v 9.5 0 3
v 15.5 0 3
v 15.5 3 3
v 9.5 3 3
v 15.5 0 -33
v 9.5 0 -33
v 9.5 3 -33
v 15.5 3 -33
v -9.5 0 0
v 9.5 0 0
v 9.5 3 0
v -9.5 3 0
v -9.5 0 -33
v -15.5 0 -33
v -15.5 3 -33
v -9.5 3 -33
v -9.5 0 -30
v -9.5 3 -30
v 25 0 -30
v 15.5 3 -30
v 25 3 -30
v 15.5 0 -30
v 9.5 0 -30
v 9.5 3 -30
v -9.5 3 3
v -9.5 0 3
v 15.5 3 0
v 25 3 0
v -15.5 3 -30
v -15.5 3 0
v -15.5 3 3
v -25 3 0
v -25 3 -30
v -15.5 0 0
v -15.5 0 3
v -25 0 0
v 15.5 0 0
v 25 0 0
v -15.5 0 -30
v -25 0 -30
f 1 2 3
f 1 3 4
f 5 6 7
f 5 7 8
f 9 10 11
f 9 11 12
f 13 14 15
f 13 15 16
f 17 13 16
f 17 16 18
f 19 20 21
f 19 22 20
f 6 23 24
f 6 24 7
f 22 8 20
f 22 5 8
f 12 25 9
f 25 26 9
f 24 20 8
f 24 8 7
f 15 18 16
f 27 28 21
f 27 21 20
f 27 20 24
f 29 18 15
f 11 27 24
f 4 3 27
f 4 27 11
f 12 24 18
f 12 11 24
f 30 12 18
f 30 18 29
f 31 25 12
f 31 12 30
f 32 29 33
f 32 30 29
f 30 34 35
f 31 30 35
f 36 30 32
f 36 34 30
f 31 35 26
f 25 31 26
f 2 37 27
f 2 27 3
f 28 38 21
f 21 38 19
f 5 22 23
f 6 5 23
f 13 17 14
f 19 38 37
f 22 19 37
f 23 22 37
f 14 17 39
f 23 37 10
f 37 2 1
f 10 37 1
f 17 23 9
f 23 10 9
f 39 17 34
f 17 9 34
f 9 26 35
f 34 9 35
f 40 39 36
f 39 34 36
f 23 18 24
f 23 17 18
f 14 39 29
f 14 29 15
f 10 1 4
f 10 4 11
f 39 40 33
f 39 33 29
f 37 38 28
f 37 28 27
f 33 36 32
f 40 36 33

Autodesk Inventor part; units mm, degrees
ref_plane "YZ Plane" through (0, 0, 0) normal (1, 0, 0) x (0, 1, 0)
ref_plane "XZ Plane" through (0, 0, 0) normal (0, 1, 0) x (-1, 0, 0)
ref_plane "XY Plane" through (0, 0, 0) normal (0, 0, 1) x (1, 0, 0)
sketch "Sketch1" plane through (0, 0, 0) normal (0, 1, 0) x (-1, 0, 0)
  line L0 (-15.5, 0) -> (-15.5, 3)
  line L1 (-15.5, 3) -> (-9.5, 3)
  line L2 (-9.5, 3) -> (-9.5, 0)
  line L3 (15.5, 0) -> (15.5, 3)
  line L4 (15.5, 3) -> (9.5, 3)
  line L5 (9.5, 3) -> (9.5, 0)
  line L6 (-15.5, 0) -> (-15.5, 3)
  line L7 (-15.5, 3) -> (-9.5, 3)
  line L8 (-9.5, 3) -> (-9.5, 0)
  line L9 (15.5, 0) -> (15.5, 3)
  line L10 (15.5, 3) -> (9.5, 3)
  line L11 (9.5, 3) -> (9.5, 0)
  line L12 (-25, 0) -> (-15.5, 0)
  line L13 (-9.5, 0) -> (9.5, 0)
  line L14 (15.5, 0) -> (25, 0)
  line L15 (25, 0) -> (25, -30)
  line L16 (-25, 0) -> (-25, -30)
  line L17 (25, -30) -> (15.5, -30)
  line L18 (15.5, -30) -> (15.5, -33)
  line L19 (15.5, -33) -> (9.5, -33)
  line L20 (9.5, -33) -> (9.5, -30)
  line L21 (9.5, -30) -> (-9.5, -30)
  line L22 (-9.5, -30) -> (-9.5, -33)
  line L23 (-9.5, -33) -> (-15.5, -33)
  line L24 (-15.5, -33) -> (-15.5, -30)
  line L25 (-15.5, -30) -> (-25, -30)
  point P0 (0, 0)
  dimension "d3" = 3
  dimension "d4" = 6
  dimension "d7" = 3
  dimension "d8" = 6
  dimension "d12" = 3
  dimension "d13" = 6
  dimension "d16" = 3
  dimension "d17" = 6
  dimension "d19" = 30
  dimension "d20" = 30
  dimension "d21" = 3
extrude "Extrusion1" add sketch "Sketch1" along normal blind 3
properties part number "Ball Capture Zone Cover plate" material "Rubber"
